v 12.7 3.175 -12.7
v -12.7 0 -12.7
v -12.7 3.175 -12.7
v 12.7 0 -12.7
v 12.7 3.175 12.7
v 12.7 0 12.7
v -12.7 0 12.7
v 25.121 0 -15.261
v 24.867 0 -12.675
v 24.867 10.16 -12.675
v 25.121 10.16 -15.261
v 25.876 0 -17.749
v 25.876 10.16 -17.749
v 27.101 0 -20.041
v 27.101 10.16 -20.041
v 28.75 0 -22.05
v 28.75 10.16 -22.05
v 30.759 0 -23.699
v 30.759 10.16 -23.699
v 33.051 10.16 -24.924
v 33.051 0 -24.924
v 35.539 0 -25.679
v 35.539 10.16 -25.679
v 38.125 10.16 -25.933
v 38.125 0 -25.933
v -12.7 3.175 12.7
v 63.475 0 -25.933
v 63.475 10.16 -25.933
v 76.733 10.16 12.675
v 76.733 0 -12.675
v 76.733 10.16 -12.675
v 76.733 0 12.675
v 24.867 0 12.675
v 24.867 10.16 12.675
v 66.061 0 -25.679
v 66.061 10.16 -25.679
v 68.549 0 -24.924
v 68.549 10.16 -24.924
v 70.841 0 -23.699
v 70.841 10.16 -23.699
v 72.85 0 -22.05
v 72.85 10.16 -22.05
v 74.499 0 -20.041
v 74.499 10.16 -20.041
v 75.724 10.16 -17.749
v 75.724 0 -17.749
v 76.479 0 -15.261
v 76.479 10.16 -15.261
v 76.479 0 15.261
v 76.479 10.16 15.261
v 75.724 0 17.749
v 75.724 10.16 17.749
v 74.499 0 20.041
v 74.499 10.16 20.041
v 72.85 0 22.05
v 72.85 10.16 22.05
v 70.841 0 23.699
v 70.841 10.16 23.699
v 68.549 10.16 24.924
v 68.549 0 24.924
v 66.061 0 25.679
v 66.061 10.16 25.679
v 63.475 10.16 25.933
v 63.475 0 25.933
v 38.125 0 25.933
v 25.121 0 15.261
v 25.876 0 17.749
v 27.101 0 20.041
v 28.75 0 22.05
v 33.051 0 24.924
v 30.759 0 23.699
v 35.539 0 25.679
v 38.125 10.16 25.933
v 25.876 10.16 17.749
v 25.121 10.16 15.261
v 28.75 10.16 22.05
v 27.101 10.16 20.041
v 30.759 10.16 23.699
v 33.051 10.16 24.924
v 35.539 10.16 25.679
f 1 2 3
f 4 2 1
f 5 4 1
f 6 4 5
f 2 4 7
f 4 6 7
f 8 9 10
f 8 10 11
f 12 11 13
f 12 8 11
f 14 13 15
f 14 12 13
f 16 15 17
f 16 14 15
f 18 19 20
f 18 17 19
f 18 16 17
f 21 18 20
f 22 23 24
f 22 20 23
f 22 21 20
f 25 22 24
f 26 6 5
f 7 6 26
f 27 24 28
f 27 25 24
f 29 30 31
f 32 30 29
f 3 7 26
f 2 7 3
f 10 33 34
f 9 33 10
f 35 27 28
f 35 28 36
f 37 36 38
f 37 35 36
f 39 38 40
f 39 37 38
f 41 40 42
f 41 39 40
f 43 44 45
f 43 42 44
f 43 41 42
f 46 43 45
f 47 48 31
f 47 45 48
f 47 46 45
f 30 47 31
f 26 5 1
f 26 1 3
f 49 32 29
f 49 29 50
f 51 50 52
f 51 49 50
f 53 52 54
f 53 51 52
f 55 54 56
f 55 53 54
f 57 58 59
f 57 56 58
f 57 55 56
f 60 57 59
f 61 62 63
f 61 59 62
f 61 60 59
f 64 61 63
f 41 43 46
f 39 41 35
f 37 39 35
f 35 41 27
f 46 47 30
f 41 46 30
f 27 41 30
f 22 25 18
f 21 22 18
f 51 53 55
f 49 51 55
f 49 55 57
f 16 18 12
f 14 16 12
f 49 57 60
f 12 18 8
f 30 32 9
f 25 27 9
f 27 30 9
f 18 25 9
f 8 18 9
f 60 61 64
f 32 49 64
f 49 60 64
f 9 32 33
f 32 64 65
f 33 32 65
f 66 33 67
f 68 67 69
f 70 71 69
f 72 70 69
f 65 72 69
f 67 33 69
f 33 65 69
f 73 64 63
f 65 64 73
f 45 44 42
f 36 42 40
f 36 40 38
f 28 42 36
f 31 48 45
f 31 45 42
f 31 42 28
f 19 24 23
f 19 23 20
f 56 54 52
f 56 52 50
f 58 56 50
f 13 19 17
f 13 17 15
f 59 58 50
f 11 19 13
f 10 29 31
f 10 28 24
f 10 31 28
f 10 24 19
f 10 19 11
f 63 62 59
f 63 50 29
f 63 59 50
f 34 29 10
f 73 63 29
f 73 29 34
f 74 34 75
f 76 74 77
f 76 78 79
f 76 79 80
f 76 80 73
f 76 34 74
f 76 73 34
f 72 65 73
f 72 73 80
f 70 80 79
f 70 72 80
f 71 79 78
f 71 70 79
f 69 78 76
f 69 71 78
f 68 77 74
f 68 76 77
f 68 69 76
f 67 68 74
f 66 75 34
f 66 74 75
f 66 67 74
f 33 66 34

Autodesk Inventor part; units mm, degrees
ref_plane "YZ Plane" through (0, 0, 0) normal (1, 0, 0) x (0, 1, 0)
ref_plane "XZ Plane" through (0, 0, 0) normal (0, 1, 0) x (-1, 0, 0)
ref_plane "XY Plane" through (0, 0, 0) normal (0, 0, 1) x (1, 0, 0)
sketch "Sketch1" plane through (0, 0, 0) normal (0, 1, 0) x (-1, 0, 0)
  line L0 (12.7, -12.7) -> (-12.7, -12.7)
  line L1 (-12.7, -12.7) -> (-12.7, 12.7)
  line L2 (-12.7, 12.7) -> (12.7, 12.7)
  line L3 (12.7, 12.7) -> (12.7, -12.7)
  line L4 (12.7, -12.7) -> (-12.7, 12.7) construction
  line L5 (-12.7, -12.7) -> (12.7, 12.7) construction
  point P0 (0, 0)
  dimension "d0" = 25.4
  dimension "d1" = 25.4
extrude "Extrusion1" add sketch "Sketch1" along normal blind 3.175
sketch "Sketch2" plane through (0, 0, 0) normal (0, 1, 0) x (-1, 0, 0)
  line L0 (-38.1254, -25.9334) -> (-63.4746, -25.9334)
  line L1 (-76.7334, -12.6746) -> (-76.7334, 12.6746)
  line L2 (-63.4746, 25.9334) -> (-38.1254, 25.9334)
  line L3 (-24.8666, 12.6746) -> (-24.8666, -12.6746)
  line L4 (-24.8666, -25.9334) -> (-76.7334, 25.9334) construction
  line L5 (-76.7334, -25.9334) -> (-24.8666, 25.9334) construction
  arc A0 (-38.1254, -25.9334) -> (-24.8666, -12.6746) centre (-38.1254, -12.6746) ccw
  arc A1 (-24.8666, 12.6746) -> (-38.1254, 25.9334) centre (-38.1254, 12.6746) ccw
  arc A2 (-63.4746, 25.9334) -> (-76.7334, 12.6746) centre (-63.4746, 12.6746) ccw
  arc A3 (-76.7334, -12.6746) -> (-63.4746, -25.9334) centre (-63.4746, -12.6746) ccw
  point P0 (0, 0)
  point P1 (-50.8, 0)
  point P2 (-50.8, 0)
  dimension "d4" = 51.8668
  dimension "d5" = 51.8668
  dimension "d6" = 50.8
  dimension "d9" = 13.2588
  dimension "d10" = 13.2588
extrude "Extrusion2" add sketch "Sketch2" along normal blind 10.16 separate body
equation "\"d9\" = d10"
properties part number "Calibration Inch Square"
